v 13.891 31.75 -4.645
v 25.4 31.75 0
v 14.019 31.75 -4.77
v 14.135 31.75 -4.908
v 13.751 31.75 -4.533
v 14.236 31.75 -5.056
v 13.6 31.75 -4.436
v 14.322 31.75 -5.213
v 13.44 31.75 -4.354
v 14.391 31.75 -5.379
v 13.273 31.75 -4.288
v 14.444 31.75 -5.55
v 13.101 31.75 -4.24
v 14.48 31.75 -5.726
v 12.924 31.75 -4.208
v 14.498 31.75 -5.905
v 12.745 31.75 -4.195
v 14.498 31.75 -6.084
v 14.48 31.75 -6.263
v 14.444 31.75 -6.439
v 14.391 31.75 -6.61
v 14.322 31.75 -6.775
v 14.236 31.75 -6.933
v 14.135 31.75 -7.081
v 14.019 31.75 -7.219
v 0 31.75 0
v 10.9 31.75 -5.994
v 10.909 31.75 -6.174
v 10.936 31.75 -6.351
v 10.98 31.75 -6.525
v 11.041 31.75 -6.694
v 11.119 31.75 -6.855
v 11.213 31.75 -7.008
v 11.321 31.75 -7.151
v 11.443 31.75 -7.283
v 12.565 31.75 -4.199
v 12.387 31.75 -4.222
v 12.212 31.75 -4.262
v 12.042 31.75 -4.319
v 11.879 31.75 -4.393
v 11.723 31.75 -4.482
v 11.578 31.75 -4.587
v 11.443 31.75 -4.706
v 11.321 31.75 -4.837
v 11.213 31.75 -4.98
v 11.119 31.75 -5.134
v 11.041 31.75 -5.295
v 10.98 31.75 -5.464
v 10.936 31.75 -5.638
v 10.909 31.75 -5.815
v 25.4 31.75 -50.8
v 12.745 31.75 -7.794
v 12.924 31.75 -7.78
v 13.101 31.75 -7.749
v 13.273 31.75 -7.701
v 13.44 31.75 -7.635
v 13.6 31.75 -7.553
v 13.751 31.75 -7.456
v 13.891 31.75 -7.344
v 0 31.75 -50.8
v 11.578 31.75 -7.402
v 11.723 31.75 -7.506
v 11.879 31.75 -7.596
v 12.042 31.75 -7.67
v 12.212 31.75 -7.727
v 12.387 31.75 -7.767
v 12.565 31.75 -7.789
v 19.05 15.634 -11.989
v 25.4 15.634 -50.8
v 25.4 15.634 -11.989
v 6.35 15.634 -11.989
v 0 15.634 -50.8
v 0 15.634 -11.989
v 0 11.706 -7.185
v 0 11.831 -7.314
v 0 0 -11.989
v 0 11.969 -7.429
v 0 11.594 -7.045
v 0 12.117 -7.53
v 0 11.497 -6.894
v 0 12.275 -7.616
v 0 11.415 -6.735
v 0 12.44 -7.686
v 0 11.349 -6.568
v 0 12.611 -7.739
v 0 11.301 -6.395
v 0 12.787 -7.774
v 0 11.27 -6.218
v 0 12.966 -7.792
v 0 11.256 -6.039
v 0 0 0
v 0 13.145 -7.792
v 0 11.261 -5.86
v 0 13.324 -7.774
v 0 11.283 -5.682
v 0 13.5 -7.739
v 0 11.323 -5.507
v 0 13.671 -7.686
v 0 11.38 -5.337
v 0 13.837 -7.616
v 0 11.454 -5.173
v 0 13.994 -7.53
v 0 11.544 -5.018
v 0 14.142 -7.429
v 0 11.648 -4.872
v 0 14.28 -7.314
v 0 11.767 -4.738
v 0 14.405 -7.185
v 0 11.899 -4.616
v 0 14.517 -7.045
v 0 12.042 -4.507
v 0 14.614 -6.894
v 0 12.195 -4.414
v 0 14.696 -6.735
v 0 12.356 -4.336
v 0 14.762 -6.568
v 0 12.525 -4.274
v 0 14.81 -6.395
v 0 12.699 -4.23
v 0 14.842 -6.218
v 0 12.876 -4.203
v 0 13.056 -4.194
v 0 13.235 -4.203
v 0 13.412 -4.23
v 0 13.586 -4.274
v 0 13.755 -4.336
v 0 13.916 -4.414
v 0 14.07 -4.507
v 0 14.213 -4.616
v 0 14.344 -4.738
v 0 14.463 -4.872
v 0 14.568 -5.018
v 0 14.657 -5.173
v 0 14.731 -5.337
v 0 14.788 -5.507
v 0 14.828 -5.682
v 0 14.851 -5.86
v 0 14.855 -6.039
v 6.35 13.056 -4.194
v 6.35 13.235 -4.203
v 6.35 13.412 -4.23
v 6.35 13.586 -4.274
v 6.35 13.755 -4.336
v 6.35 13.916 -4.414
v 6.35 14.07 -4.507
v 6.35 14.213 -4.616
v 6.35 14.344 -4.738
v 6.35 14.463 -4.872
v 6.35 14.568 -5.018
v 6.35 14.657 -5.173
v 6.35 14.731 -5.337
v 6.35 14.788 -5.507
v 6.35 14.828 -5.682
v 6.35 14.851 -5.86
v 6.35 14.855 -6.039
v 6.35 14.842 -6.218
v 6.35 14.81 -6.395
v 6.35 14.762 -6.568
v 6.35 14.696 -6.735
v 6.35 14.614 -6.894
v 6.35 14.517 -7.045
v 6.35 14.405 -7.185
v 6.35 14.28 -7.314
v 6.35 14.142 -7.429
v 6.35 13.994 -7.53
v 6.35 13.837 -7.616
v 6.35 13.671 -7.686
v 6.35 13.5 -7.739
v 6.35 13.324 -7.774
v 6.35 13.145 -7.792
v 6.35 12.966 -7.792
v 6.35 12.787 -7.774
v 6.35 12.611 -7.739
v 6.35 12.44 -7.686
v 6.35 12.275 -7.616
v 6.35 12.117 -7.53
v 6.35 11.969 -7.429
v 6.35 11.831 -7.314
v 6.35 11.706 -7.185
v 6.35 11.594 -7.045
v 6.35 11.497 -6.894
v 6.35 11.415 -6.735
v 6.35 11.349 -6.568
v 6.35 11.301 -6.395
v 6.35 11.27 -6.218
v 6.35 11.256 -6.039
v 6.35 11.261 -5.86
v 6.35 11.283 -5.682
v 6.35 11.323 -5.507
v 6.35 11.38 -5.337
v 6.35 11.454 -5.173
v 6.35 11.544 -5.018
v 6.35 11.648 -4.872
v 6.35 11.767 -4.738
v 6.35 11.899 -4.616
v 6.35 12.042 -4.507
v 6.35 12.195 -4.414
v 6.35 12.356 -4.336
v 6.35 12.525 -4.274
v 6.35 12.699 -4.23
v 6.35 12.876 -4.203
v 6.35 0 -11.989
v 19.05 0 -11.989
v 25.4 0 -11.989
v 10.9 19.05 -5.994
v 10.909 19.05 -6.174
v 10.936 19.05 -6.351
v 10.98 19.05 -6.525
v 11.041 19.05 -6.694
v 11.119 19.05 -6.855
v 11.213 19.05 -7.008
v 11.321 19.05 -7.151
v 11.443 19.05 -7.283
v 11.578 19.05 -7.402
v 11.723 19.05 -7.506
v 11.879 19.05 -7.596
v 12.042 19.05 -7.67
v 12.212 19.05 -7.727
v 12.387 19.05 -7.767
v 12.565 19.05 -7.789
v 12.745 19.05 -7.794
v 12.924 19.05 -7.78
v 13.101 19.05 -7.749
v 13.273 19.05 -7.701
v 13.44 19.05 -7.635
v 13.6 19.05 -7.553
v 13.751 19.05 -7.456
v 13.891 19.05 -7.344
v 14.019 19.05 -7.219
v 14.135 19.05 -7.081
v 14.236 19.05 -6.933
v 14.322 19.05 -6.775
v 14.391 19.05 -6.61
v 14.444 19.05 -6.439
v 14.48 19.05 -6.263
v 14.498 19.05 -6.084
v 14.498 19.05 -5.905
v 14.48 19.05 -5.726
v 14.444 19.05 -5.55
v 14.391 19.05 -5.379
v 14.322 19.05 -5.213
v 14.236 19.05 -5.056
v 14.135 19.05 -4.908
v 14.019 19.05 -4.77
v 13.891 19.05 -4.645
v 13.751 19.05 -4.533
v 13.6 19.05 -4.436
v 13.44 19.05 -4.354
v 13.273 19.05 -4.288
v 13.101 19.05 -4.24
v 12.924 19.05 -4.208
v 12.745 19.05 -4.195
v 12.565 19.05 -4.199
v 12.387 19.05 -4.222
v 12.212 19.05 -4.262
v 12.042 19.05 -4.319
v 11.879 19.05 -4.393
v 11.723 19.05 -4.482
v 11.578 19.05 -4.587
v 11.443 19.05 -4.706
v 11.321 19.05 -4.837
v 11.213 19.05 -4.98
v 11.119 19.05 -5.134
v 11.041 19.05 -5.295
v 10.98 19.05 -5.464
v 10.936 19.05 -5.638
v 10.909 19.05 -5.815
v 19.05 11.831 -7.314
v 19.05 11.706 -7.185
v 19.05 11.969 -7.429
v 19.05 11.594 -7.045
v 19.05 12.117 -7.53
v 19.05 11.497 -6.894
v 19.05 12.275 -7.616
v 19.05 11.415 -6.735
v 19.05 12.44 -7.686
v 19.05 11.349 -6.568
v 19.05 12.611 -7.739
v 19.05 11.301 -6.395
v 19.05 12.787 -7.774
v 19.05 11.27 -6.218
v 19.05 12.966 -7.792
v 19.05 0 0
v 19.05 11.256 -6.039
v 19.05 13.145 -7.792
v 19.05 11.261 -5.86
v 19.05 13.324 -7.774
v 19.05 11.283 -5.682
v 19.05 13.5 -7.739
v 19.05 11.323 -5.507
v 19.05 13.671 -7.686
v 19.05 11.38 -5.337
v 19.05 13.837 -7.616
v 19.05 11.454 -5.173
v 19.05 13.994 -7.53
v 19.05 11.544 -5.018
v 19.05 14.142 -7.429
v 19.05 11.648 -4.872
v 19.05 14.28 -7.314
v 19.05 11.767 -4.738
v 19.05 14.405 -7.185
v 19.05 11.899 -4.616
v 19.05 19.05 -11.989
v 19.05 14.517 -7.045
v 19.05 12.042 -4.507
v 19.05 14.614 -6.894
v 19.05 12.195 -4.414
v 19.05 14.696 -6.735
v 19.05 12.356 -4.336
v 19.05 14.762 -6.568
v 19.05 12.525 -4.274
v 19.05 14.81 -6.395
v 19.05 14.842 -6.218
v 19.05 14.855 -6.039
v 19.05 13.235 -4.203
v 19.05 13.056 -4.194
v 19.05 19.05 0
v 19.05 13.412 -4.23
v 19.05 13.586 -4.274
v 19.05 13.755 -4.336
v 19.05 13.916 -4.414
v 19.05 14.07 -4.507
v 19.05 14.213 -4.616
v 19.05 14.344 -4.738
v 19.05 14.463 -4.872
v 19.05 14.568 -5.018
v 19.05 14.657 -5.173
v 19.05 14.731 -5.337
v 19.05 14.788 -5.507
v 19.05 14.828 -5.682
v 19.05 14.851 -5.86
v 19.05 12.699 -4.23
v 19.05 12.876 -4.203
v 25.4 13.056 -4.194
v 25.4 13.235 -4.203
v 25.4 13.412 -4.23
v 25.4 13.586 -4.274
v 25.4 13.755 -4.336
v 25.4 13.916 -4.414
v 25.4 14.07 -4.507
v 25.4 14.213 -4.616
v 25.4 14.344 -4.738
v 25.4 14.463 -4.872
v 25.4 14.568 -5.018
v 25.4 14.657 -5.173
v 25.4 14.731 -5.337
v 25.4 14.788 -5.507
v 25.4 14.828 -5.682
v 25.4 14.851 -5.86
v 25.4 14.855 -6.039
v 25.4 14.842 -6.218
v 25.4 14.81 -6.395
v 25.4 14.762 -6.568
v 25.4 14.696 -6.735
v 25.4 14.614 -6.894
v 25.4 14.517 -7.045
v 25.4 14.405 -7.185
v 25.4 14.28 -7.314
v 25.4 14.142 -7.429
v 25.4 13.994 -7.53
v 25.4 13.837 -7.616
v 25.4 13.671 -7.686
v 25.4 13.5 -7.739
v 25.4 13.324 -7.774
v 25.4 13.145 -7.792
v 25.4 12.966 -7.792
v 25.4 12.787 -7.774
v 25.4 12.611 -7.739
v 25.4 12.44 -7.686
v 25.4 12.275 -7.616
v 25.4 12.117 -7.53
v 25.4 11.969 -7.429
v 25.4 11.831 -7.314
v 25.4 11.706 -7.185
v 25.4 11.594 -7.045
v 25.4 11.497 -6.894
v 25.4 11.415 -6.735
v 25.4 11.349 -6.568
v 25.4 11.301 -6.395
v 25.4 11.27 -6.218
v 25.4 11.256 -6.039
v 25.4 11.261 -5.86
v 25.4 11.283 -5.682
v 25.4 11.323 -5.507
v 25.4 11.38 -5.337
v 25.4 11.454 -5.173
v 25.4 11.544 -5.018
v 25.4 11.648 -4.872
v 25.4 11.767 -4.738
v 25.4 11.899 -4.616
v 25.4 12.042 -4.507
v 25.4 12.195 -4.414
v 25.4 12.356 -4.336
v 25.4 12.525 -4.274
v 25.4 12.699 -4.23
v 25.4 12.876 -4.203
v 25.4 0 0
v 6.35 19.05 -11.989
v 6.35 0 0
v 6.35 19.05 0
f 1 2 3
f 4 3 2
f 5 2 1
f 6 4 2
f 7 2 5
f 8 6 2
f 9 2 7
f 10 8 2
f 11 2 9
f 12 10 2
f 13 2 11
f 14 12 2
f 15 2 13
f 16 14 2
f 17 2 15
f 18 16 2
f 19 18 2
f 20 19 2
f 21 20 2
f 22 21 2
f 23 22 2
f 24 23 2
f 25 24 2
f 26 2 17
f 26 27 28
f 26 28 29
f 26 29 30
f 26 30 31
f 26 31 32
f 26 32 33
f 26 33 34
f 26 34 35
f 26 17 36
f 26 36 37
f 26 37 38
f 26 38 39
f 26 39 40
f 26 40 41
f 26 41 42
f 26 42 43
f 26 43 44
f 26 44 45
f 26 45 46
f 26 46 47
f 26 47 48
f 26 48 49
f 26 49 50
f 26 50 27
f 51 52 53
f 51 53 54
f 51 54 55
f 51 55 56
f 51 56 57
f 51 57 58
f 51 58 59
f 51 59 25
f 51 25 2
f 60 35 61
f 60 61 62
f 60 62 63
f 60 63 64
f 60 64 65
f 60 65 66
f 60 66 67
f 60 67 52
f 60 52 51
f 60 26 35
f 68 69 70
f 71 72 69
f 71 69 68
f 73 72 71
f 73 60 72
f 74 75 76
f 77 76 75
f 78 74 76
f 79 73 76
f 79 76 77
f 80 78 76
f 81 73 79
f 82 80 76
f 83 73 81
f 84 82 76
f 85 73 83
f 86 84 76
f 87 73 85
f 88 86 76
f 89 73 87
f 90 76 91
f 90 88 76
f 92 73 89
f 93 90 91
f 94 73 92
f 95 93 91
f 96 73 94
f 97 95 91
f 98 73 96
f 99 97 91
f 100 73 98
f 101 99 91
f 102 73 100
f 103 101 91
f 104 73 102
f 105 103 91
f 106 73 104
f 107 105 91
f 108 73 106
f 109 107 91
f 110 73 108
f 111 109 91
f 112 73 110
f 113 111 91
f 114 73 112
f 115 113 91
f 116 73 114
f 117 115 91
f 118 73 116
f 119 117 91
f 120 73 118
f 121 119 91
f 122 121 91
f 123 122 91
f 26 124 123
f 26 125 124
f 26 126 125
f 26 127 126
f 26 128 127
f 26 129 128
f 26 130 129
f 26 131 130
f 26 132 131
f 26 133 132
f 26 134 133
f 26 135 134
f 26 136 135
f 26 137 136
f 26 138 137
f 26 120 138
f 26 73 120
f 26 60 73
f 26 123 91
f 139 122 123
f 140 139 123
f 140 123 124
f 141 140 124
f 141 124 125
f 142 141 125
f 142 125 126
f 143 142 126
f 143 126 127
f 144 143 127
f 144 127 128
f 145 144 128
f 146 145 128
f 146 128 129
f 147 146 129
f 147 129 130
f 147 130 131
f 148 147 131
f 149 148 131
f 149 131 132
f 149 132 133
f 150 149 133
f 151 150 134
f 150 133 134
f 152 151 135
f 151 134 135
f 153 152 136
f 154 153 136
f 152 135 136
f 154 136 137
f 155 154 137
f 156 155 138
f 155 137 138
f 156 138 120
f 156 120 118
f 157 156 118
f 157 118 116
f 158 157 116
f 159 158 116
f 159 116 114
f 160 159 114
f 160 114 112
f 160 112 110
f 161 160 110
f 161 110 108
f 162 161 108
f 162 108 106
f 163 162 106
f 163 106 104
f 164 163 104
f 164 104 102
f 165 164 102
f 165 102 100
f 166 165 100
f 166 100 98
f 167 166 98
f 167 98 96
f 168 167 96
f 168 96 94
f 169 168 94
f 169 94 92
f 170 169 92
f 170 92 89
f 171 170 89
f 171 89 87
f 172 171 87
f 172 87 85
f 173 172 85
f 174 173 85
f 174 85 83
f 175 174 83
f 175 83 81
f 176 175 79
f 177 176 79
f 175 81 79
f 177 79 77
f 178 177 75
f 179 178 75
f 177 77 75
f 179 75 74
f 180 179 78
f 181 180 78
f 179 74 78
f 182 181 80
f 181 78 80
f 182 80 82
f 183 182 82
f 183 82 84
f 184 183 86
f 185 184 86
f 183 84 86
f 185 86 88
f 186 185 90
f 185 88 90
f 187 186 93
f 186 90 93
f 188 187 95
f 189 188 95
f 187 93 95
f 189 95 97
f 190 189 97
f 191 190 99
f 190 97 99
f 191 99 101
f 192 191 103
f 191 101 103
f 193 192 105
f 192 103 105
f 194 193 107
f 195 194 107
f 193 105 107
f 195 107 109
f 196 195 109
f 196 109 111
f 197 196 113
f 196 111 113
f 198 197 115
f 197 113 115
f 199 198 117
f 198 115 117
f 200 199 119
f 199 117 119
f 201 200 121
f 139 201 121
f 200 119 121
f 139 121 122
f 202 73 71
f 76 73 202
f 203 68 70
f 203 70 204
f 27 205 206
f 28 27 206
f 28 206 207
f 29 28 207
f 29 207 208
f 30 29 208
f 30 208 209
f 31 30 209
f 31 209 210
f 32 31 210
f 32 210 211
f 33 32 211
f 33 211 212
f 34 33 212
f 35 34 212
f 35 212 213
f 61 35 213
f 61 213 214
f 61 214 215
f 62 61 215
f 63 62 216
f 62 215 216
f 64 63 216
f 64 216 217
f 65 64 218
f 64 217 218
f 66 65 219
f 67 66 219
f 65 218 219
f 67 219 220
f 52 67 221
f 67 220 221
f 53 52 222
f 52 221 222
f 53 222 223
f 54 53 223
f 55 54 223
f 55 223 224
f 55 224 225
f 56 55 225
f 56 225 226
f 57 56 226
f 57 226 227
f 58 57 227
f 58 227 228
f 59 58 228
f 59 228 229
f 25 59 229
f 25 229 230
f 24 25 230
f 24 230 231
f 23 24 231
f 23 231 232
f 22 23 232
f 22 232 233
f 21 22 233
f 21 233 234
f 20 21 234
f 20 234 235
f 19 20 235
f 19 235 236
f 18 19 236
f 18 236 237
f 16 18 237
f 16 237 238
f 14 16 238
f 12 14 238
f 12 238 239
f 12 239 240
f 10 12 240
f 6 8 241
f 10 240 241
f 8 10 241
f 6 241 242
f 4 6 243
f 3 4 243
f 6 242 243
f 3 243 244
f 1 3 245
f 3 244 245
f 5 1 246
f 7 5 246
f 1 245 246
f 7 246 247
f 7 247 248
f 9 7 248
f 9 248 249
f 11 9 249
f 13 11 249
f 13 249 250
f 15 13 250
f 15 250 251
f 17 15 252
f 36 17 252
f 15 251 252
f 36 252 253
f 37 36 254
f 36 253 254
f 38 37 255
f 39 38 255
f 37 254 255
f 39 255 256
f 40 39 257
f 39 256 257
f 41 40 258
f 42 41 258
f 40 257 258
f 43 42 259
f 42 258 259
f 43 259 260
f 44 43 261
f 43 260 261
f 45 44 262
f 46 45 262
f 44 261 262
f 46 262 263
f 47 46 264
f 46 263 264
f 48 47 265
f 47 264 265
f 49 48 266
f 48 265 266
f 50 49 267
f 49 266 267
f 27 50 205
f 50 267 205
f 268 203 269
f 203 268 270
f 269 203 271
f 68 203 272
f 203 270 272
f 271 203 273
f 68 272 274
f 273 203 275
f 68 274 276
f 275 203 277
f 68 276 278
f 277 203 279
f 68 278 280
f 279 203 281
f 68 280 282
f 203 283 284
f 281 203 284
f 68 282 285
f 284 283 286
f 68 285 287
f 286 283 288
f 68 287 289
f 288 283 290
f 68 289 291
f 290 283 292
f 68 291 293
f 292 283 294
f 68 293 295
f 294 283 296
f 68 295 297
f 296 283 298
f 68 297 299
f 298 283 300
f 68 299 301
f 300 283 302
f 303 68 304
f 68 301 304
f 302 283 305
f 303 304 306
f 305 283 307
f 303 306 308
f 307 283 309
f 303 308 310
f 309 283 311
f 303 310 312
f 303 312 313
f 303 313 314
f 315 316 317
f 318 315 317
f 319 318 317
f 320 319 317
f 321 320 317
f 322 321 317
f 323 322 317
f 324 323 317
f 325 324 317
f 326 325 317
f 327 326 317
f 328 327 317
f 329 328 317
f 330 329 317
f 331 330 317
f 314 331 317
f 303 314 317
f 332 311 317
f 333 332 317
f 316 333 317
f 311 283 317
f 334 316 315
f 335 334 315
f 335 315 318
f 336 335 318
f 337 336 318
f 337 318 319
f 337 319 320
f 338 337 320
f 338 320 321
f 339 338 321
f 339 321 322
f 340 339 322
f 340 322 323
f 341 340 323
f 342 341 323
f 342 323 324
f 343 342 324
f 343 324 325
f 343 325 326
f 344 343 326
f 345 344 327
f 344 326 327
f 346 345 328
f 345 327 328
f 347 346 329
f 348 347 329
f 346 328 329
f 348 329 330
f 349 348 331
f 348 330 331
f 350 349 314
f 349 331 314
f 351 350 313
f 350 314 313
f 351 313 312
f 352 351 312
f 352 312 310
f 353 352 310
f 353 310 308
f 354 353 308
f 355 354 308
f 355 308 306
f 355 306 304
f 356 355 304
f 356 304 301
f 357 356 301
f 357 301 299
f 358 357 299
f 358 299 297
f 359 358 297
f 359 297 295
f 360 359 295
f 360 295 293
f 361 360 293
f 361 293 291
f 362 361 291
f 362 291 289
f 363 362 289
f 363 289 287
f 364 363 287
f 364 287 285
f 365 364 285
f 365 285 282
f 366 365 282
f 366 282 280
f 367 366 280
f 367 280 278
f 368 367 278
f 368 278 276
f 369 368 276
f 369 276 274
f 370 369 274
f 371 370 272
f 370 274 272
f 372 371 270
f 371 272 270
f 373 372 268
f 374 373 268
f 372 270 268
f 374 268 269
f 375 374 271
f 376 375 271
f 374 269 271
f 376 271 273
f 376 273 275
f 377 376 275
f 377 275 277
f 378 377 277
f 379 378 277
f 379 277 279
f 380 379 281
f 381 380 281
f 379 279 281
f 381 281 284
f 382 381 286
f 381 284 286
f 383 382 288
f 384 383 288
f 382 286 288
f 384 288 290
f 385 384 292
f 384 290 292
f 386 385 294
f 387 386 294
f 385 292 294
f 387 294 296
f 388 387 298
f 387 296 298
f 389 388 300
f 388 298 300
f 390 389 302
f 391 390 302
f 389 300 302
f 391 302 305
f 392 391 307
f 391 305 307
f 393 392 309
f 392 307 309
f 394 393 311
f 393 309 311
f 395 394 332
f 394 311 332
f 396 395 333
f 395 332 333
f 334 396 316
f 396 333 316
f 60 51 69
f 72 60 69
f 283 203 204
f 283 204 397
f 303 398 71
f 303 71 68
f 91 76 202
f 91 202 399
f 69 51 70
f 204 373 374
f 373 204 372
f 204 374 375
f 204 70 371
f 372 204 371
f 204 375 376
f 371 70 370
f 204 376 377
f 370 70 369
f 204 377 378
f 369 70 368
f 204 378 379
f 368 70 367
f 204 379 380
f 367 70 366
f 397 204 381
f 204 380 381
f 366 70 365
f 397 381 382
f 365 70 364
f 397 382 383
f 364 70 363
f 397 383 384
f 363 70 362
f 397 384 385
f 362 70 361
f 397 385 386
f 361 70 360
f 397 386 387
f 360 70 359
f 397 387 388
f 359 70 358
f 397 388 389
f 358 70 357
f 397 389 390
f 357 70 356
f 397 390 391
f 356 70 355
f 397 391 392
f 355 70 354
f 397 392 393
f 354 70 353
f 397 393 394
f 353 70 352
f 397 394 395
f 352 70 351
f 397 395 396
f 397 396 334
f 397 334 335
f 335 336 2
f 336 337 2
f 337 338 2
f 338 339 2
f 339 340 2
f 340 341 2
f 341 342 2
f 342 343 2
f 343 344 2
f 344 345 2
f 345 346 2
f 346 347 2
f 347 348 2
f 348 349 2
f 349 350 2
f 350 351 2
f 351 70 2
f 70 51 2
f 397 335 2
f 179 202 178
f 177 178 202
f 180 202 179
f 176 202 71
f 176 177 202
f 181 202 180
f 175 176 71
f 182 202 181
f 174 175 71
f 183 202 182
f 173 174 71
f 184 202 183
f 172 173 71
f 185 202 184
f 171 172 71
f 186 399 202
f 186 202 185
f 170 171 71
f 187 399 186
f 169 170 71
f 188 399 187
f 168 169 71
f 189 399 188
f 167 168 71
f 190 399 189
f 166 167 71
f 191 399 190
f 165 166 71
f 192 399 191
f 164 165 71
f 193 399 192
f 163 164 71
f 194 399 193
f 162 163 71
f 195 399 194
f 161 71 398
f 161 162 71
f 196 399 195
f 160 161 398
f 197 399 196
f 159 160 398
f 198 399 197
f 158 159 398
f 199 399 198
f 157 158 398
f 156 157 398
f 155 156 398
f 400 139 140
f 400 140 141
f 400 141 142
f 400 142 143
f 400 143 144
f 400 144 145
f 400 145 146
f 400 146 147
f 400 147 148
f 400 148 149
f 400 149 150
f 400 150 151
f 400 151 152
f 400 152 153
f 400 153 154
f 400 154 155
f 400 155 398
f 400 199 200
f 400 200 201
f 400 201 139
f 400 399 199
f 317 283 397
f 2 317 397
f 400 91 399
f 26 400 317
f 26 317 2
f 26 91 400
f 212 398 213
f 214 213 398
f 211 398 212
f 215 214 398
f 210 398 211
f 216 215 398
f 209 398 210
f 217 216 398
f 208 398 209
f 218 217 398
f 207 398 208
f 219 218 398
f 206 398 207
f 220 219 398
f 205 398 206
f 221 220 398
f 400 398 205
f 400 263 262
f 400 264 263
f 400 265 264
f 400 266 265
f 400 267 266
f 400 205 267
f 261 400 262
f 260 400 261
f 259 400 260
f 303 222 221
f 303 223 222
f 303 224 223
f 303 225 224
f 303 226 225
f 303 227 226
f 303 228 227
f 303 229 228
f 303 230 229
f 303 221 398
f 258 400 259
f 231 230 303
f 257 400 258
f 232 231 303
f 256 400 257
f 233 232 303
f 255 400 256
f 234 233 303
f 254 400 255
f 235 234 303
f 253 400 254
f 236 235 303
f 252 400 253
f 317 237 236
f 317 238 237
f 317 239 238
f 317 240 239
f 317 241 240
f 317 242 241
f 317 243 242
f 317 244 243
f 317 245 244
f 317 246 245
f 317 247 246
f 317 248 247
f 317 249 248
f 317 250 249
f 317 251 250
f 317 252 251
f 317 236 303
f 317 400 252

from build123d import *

# Parameters (mm, degrees)
BOSS_EXTRUDE1_DEPTH  = 25.4
SKETCH2_W            = 12.7
SKETCH2_H            = 19.05
CUT_EXTRUDE1_DEPTH   = 11.9888
M3_CLEARANCE_HOLE1_D = 3.6
M3_CLEARANCE_HOLE2_D = 3.6


with BuildPart() as part:
    # Sketch1 → Boss-Extrude1 (new body)
    with BuildSketch(Plane(origin=(0, 0, 0), x_dir=(0, 0, -1), z_dir=(1, 0, 0))):
        Polygon((0, 0), (0, 31.75), (50.8, 31.75), (50.8, 15.6337), (11.9888, 15.6337), (11.9888, 0), align=None)
    extrude(amount=BOSS_EXTRUDE1_DEPTH)

    # Sketch2 → Cut-Extrude1 (cut)
    with BuildSketch(Plane.XY):
        with Locations((12.7, 9.525)):
            Rectangle(SKETCH2_W, SKETCH2_H)
    extrude(amount=-CUT_EXTRUDE1_DEPTH, mode=Mode.SUBTRACT)

    # M3 Clearance Hole1 (through all)
    with Locations(Plane(origin=(25.4, 0, 0), x_dir=(0, 0, -1), z_dir=(1, 0, 0))):
        with Locations((5.9944, 13.0556)):
            Hole(M3_CLEARANCE_HOLE1_D / 2)

    # M3 Clearance Hole2 (through all)
    with Locations(Plane(origin=(0, 31.75, 0), x_dir=(1, 0, 0), z_dir=(0, 1, 0))):
        with Locations((12.7, 5.9944)):
            Hole(M3_CLEARANCE_HOLE2_D / 2)


solid = part.part
